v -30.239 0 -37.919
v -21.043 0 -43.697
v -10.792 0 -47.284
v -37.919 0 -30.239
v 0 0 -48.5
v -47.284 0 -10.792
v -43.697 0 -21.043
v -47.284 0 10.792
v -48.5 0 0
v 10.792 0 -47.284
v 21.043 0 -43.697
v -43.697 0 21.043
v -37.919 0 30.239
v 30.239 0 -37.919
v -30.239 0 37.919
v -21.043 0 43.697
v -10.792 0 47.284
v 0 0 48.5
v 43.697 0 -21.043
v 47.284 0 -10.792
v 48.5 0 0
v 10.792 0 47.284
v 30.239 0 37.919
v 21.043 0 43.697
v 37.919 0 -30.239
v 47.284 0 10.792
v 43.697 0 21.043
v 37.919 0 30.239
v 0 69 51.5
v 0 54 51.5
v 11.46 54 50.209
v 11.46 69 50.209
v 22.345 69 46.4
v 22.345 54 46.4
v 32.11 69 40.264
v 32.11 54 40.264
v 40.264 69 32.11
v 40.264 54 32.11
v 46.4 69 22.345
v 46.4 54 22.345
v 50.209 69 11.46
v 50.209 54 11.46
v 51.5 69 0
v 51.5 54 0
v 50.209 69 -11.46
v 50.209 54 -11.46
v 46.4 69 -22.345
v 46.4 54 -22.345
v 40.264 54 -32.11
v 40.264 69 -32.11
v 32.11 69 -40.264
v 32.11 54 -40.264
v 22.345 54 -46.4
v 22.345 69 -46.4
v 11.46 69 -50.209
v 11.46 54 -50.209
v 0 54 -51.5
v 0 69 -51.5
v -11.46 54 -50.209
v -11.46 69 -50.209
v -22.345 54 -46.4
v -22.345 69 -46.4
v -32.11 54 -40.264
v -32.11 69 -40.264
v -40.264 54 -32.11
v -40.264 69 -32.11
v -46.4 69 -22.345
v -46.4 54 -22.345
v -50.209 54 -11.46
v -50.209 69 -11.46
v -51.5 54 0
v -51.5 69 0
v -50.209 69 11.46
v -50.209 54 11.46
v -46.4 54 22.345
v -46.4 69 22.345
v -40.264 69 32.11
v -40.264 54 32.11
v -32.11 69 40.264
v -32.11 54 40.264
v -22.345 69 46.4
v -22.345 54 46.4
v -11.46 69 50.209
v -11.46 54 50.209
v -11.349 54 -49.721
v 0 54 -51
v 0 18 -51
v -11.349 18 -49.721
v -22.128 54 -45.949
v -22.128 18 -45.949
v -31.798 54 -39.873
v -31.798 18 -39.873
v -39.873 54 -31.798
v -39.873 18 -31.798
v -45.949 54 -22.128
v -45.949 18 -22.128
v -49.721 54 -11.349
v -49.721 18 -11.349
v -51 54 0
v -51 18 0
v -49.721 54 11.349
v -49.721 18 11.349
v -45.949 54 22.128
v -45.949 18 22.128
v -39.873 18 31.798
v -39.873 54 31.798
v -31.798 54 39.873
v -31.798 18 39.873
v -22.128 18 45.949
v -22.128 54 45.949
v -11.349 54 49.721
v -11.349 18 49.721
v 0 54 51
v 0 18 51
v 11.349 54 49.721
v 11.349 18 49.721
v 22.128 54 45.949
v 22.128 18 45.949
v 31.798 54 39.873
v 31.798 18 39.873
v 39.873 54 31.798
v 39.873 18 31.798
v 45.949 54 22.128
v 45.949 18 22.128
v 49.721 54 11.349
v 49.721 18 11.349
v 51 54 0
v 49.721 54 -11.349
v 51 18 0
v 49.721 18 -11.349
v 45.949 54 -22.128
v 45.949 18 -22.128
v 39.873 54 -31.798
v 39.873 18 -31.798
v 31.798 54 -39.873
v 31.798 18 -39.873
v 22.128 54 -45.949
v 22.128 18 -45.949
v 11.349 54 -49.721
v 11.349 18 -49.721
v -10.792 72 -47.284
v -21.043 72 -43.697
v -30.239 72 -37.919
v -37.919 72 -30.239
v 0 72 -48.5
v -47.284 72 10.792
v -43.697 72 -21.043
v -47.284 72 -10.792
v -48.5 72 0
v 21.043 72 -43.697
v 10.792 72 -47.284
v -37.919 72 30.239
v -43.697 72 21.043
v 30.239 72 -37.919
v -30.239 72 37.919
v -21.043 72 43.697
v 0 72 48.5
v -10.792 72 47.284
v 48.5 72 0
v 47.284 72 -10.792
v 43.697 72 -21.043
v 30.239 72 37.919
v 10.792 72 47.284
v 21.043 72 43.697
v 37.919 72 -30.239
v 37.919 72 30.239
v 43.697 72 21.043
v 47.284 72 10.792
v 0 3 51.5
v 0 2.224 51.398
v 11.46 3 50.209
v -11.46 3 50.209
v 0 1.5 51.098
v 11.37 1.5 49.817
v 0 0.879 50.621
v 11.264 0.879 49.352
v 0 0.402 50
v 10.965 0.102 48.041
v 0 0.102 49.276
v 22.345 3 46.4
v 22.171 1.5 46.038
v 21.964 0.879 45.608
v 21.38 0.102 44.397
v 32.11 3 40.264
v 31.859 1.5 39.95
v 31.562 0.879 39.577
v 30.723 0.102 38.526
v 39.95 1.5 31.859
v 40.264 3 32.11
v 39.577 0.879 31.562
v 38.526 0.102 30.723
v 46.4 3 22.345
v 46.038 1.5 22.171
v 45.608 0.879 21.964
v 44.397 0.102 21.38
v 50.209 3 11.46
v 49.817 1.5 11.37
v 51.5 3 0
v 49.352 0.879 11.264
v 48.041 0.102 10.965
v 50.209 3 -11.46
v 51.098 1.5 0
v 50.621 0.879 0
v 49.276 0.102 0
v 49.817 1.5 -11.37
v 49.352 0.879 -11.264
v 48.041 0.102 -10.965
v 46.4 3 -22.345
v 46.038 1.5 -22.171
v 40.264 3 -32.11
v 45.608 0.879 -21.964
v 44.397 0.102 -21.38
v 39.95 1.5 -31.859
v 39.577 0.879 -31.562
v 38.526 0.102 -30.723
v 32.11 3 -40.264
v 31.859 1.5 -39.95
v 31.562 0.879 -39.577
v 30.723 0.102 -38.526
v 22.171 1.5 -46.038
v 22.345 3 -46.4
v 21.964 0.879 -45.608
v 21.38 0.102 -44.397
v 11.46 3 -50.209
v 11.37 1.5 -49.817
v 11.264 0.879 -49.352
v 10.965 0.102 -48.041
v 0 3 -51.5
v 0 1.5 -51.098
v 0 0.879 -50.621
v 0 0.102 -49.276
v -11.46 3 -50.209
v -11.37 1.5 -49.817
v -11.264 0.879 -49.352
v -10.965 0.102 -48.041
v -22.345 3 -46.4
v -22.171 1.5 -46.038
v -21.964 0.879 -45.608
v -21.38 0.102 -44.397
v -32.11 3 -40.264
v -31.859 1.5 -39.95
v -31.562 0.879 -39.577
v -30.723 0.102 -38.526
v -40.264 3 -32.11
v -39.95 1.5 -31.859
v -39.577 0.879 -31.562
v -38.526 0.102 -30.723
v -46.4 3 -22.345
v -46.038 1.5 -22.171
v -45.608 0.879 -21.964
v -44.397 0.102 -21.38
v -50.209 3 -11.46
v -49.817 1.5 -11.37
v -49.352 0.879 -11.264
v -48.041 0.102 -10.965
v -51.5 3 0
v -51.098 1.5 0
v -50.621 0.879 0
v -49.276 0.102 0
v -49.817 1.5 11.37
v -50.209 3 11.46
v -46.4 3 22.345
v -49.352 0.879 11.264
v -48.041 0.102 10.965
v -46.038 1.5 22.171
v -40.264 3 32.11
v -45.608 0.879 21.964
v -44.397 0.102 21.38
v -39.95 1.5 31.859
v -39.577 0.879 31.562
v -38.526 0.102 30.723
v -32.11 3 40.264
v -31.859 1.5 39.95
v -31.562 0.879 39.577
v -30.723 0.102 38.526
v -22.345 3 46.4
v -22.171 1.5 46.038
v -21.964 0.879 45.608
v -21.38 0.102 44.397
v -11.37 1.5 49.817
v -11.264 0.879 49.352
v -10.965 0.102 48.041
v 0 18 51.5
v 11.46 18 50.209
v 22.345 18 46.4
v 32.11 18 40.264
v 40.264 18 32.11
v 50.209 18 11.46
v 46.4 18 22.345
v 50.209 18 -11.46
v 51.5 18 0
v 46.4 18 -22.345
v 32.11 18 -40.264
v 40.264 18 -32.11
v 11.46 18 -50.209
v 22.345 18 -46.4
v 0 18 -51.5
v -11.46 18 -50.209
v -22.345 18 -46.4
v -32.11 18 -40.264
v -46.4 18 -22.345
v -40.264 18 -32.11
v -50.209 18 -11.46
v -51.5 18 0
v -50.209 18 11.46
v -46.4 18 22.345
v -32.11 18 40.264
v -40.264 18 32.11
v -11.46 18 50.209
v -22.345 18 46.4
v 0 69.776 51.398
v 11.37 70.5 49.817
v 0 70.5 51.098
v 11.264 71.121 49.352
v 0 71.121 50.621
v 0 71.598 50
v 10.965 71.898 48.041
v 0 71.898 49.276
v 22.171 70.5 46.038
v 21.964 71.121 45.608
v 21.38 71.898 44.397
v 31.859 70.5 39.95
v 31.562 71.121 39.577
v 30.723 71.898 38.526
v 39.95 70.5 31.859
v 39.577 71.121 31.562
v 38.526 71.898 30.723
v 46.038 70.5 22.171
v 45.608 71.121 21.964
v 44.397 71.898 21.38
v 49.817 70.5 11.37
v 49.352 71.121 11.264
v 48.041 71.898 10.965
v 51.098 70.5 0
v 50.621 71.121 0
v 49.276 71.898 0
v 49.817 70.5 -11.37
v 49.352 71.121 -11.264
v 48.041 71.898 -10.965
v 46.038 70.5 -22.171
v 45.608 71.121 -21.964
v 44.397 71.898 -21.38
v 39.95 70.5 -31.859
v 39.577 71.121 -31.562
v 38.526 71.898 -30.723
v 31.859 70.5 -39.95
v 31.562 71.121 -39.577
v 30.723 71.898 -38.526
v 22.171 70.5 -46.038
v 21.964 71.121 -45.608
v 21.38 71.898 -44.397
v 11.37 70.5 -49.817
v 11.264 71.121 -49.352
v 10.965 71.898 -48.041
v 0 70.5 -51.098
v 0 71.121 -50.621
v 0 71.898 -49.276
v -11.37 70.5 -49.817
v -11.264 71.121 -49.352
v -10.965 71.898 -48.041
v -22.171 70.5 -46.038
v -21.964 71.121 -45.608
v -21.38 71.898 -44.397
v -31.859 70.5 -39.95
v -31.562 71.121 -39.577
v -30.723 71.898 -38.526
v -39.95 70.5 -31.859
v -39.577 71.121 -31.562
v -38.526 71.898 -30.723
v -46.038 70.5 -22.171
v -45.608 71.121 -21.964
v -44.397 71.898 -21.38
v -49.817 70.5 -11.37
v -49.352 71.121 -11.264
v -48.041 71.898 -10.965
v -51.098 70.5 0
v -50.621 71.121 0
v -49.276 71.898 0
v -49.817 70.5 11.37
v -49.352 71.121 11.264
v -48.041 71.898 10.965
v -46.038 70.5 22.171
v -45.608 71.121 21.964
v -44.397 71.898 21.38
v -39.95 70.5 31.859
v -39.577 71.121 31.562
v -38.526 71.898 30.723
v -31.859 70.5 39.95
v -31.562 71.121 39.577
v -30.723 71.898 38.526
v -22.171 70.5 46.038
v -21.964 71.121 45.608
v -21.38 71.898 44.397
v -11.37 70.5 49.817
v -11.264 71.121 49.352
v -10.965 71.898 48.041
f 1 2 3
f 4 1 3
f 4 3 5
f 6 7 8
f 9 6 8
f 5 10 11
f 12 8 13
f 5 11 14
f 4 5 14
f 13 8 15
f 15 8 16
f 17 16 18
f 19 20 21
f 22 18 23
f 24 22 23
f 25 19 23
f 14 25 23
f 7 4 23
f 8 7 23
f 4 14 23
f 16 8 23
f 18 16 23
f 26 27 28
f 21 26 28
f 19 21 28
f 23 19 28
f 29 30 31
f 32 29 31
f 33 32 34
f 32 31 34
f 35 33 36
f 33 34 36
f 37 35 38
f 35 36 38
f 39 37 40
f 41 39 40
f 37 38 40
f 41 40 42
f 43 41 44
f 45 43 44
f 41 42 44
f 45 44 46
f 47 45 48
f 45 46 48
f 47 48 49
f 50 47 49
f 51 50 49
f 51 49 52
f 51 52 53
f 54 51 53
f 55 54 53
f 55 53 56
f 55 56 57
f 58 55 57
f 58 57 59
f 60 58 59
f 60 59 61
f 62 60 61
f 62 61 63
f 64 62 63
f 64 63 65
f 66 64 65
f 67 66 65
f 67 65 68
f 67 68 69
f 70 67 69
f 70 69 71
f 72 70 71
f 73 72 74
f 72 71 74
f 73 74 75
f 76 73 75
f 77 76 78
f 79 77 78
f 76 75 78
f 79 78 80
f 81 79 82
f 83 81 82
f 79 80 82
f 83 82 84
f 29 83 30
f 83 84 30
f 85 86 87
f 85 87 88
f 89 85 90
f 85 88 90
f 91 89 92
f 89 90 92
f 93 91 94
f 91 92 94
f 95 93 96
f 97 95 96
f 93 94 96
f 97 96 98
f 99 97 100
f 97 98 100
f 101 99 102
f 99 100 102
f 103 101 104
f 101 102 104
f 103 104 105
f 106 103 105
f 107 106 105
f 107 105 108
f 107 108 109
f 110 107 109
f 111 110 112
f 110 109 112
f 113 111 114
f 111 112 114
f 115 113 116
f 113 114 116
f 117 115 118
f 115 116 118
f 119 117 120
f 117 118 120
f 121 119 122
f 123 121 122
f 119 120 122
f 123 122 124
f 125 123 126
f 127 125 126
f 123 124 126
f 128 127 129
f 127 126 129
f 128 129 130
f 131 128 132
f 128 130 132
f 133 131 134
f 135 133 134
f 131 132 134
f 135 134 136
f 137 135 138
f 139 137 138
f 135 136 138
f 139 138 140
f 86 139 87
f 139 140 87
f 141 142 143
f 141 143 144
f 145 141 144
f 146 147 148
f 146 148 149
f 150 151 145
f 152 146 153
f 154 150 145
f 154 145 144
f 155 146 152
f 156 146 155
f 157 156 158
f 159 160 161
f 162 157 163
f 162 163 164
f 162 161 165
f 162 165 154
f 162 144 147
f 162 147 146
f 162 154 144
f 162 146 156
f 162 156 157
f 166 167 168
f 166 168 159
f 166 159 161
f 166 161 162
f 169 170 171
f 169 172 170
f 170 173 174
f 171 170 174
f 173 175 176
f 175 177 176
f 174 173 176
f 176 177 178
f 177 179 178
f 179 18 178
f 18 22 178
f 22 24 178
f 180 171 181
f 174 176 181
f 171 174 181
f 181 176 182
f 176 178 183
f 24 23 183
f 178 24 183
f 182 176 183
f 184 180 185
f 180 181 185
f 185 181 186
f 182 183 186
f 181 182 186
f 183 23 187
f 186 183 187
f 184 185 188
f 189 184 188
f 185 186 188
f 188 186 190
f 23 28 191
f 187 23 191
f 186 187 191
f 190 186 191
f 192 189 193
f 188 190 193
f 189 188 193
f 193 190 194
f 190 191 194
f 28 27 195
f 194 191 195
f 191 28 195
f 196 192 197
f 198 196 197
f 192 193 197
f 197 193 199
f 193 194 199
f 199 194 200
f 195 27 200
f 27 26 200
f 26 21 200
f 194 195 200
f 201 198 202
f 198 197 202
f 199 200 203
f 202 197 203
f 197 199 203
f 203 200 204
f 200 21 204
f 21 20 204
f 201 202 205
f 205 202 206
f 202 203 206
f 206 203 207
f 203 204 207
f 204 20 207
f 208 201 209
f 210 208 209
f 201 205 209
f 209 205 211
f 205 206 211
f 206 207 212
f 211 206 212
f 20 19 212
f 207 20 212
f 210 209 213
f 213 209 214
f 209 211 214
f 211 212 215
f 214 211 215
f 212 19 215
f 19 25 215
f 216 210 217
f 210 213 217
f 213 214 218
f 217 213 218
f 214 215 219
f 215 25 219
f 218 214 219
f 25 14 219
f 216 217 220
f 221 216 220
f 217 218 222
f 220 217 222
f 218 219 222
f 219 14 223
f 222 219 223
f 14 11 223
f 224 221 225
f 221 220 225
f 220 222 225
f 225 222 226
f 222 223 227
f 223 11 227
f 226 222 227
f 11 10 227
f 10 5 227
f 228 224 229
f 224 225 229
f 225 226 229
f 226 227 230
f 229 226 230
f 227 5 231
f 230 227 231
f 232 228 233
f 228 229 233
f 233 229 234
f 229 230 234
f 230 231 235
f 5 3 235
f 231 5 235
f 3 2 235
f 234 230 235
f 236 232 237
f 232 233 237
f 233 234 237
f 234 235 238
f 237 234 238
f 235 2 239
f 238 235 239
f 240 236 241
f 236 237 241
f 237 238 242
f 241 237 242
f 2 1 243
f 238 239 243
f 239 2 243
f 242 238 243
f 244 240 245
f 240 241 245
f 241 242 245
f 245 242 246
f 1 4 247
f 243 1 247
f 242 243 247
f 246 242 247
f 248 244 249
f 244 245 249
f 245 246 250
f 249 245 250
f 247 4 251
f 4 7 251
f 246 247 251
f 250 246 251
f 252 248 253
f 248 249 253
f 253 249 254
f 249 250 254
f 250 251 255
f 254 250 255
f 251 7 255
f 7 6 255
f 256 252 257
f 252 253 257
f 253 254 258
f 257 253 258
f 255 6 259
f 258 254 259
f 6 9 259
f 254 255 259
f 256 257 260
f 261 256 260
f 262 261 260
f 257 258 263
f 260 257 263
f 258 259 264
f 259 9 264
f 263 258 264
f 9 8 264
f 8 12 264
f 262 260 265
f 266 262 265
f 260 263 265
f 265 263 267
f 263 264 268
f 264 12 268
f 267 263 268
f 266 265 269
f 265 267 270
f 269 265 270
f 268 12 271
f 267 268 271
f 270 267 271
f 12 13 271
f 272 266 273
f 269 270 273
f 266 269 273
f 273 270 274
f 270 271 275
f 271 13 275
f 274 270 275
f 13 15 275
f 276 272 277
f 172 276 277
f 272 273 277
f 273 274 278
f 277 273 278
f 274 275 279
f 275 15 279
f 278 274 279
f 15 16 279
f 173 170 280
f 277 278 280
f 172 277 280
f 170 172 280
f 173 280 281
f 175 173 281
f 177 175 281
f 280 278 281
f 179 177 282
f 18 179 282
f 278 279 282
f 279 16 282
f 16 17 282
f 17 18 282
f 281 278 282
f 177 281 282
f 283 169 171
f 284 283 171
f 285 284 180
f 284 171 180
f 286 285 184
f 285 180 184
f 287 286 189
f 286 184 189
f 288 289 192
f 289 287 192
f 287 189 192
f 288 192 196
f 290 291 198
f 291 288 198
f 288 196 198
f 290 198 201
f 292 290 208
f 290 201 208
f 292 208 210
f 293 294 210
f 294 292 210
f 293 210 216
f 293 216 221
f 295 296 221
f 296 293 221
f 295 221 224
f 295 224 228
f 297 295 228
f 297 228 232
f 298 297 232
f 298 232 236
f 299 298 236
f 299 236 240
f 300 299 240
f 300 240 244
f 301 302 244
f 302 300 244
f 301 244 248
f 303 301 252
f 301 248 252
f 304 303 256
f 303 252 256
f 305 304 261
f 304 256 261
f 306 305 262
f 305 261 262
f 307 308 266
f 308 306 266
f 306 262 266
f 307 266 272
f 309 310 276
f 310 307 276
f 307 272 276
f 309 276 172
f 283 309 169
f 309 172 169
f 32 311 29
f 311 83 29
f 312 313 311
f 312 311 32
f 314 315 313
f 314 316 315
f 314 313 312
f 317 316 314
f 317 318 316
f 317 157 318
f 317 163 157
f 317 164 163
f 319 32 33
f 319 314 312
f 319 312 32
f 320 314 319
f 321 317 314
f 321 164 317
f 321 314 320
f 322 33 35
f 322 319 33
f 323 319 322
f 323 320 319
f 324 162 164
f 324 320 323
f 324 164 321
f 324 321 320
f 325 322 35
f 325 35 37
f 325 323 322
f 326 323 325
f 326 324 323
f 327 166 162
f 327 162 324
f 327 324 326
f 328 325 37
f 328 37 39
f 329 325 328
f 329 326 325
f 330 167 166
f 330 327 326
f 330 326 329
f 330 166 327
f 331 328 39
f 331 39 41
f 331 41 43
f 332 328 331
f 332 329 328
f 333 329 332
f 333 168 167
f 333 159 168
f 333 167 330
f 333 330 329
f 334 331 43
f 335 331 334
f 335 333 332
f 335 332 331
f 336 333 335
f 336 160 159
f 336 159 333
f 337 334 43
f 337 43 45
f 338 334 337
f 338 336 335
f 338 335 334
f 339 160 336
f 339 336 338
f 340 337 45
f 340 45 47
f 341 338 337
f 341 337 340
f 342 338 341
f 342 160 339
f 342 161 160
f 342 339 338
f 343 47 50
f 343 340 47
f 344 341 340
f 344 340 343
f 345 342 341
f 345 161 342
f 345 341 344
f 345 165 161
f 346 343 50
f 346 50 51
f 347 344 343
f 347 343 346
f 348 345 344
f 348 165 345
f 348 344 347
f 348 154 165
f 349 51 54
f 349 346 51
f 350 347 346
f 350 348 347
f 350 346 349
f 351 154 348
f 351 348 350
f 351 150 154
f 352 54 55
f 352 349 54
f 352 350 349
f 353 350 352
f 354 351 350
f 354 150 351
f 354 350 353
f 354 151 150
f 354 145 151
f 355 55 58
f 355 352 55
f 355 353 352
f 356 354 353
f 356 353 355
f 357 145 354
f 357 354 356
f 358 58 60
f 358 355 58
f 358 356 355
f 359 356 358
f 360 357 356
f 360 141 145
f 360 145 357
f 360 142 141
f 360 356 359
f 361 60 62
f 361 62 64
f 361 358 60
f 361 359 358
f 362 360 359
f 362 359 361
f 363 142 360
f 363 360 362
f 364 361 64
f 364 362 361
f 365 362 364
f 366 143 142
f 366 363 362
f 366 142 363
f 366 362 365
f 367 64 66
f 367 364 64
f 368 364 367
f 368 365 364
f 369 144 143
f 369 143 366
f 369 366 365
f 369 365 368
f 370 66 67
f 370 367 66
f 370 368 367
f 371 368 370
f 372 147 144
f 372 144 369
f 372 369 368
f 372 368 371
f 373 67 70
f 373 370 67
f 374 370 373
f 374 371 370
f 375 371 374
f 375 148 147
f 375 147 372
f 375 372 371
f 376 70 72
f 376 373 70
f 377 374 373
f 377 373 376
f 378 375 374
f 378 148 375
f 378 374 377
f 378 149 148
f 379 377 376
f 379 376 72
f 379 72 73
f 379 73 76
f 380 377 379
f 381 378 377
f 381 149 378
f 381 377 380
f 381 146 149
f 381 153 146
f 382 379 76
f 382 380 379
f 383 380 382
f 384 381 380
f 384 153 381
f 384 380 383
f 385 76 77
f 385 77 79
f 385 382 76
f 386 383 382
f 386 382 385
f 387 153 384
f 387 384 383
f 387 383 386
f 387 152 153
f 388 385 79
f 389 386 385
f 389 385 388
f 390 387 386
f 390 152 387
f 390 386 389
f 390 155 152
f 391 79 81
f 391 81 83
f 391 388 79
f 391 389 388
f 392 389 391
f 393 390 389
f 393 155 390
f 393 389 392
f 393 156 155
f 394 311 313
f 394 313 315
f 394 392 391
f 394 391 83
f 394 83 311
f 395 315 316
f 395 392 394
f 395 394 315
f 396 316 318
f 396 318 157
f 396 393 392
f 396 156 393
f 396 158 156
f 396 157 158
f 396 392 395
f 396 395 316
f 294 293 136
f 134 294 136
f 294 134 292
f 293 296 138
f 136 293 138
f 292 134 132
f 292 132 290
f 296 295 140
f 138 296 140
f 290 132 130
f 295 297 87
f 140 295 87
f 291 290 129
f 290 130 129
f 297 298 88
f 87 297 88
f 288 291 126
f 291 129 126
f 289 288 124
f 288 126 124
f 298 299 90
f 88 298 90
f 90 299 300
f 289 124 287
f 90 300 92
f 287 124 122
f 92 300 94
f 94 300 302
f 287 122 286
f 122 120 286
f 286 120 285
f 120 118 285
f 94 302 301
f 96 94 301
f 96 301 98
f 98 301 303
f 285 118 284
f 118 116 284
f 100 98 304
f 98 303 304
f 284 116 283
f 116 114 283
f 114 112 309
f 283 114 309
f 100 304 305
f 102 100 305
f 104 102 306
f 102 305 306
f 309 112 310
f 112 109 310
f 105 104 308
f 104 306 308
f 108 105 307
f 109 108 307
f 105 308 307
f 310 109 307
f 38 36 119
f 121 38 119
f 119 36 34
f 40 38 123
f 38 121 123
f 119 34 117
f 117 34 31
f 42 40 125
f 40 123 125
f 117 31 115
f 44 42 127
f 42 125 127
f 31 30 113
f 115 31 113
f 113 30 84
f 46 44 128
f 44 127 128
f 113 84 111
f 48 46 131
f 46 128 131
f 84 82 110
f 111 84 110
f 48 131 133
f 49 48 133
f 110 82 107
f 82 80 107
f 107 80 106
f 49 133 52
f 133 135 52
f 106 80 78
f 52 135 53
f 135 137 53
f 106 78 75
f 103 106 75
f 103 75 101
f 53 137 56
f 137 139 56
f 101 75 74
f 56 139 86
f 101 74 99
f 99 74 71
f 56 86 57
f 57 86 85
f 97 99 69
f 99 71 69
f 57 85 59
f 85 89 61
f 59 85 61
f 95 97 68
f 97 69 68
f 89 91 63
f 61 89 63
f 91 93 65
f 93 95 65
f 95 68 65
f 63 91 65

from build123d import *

# Parameters (mm, degrees)
SKETCH_1_R      = 51.5
EXTRUDE_1_DEPTH = 72
FILLET_1_R      = 3


with BuildPart() as part:
    # 草图1 → 凸台-拉伸1 (new body)
    with BuildSketch(Plane(origin=(0, 0, 0), x_dir=(1, 0, 0), z_dir=(0, 1, 0))):
        with Locations(Location((0, 0, 0), (0, 0, 270))):
            Circle(SKETCH_1_R)
    extrude(amount=EXTRUDE_1_DEPTH)

    # 圆角1
    fillet_1_edges = [part.edges().sort_by_distance(p)[0] for p in [
        (0, 0, -51.5),
        (0, 72, -51.5),
    ]]
    fillet(fillet_1_edges, radius=FILLET_1_R)

    # 草图2 → 切除-旋转1 (revolve, cut)
    with BuildSketch(Plane.XY, mode=Mode.PRIVATE) as cut_revolve_1_sk:
        Polygon((51.5, 36), (51.5, 54), (51, 54), (51, 18), (51.5, 18), align=None)
    revolve(cut_revolve_1_sk.sketch.rotate(Axis((0, 0, 0), (0, 1, 0)), 90), axis=Axis((0, 0, 0), (0, 1, 0)), mode=Mode.SUBTRACT)


solid = part.part
